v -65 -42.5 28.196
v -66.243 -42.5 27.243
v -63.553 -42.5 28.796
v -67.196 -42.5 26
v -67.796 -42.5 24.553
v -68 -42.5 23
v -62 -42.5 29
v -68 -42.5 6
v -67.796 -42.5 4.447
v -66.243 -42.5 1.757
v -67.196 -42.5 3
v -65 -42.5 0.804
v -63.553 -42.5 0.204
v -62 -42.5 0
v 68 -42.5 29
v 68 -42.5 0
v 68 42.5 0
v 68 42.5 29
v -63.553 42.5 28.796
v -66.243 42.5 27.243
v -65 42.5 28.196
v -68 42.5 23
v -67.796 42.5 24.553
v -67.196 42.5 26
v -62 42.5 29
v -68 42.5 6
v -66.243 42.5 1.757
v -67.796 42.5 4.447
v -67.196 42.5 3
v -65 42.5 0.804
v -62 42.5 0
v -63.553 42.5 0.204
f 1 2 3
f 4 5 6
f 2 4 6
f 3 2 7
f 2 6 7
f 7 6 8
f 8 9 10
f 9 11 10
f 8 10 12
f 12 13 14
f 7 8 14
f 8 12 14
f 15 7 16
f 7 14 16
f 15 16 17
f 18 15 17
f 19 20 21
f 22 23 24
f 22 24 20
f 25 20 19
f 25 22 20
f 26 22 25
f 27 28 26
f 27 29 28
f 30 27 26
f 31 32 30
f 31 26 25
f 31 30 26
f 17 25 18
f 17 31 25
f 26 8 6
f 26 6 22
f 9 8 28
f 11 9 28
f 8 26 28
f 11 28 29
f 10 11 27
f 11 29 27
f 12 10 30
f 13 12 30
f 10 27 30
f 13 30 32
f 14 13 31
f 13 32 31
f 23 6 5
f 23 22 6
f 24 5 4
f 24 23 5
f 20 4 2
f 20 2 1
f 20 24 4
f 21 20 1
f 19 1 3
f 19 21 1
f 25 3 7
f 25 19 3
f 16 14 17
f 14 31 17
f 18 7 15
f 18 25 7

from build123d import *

# Parameters (mm, degrees)
SKETCH1_W           = 136
SKETCH1_H           = 85
BOSS_EXTRUDE1_DEPTH = 29
FILLET1_R           = 6


with BuildPart() as part:
    # Sketch1 → Boss-Extrude1 (new body)
    with BuildSketch(Plane.XY):
        Rectangle(SKETCH1_W, SKETCH1_H)
    extrude(amount=BOSS_EXTRUDE1_DEPTH)

    # Fillet1
    fillet1_edges = [part.edges().sort_by_distance(p)[0] for p in [
        (-68, 0, 29),
        (-68, 0, 0),
    ]]
    fillet(fillet1_edges, radius=FILLET1_R)


solid = part.part
